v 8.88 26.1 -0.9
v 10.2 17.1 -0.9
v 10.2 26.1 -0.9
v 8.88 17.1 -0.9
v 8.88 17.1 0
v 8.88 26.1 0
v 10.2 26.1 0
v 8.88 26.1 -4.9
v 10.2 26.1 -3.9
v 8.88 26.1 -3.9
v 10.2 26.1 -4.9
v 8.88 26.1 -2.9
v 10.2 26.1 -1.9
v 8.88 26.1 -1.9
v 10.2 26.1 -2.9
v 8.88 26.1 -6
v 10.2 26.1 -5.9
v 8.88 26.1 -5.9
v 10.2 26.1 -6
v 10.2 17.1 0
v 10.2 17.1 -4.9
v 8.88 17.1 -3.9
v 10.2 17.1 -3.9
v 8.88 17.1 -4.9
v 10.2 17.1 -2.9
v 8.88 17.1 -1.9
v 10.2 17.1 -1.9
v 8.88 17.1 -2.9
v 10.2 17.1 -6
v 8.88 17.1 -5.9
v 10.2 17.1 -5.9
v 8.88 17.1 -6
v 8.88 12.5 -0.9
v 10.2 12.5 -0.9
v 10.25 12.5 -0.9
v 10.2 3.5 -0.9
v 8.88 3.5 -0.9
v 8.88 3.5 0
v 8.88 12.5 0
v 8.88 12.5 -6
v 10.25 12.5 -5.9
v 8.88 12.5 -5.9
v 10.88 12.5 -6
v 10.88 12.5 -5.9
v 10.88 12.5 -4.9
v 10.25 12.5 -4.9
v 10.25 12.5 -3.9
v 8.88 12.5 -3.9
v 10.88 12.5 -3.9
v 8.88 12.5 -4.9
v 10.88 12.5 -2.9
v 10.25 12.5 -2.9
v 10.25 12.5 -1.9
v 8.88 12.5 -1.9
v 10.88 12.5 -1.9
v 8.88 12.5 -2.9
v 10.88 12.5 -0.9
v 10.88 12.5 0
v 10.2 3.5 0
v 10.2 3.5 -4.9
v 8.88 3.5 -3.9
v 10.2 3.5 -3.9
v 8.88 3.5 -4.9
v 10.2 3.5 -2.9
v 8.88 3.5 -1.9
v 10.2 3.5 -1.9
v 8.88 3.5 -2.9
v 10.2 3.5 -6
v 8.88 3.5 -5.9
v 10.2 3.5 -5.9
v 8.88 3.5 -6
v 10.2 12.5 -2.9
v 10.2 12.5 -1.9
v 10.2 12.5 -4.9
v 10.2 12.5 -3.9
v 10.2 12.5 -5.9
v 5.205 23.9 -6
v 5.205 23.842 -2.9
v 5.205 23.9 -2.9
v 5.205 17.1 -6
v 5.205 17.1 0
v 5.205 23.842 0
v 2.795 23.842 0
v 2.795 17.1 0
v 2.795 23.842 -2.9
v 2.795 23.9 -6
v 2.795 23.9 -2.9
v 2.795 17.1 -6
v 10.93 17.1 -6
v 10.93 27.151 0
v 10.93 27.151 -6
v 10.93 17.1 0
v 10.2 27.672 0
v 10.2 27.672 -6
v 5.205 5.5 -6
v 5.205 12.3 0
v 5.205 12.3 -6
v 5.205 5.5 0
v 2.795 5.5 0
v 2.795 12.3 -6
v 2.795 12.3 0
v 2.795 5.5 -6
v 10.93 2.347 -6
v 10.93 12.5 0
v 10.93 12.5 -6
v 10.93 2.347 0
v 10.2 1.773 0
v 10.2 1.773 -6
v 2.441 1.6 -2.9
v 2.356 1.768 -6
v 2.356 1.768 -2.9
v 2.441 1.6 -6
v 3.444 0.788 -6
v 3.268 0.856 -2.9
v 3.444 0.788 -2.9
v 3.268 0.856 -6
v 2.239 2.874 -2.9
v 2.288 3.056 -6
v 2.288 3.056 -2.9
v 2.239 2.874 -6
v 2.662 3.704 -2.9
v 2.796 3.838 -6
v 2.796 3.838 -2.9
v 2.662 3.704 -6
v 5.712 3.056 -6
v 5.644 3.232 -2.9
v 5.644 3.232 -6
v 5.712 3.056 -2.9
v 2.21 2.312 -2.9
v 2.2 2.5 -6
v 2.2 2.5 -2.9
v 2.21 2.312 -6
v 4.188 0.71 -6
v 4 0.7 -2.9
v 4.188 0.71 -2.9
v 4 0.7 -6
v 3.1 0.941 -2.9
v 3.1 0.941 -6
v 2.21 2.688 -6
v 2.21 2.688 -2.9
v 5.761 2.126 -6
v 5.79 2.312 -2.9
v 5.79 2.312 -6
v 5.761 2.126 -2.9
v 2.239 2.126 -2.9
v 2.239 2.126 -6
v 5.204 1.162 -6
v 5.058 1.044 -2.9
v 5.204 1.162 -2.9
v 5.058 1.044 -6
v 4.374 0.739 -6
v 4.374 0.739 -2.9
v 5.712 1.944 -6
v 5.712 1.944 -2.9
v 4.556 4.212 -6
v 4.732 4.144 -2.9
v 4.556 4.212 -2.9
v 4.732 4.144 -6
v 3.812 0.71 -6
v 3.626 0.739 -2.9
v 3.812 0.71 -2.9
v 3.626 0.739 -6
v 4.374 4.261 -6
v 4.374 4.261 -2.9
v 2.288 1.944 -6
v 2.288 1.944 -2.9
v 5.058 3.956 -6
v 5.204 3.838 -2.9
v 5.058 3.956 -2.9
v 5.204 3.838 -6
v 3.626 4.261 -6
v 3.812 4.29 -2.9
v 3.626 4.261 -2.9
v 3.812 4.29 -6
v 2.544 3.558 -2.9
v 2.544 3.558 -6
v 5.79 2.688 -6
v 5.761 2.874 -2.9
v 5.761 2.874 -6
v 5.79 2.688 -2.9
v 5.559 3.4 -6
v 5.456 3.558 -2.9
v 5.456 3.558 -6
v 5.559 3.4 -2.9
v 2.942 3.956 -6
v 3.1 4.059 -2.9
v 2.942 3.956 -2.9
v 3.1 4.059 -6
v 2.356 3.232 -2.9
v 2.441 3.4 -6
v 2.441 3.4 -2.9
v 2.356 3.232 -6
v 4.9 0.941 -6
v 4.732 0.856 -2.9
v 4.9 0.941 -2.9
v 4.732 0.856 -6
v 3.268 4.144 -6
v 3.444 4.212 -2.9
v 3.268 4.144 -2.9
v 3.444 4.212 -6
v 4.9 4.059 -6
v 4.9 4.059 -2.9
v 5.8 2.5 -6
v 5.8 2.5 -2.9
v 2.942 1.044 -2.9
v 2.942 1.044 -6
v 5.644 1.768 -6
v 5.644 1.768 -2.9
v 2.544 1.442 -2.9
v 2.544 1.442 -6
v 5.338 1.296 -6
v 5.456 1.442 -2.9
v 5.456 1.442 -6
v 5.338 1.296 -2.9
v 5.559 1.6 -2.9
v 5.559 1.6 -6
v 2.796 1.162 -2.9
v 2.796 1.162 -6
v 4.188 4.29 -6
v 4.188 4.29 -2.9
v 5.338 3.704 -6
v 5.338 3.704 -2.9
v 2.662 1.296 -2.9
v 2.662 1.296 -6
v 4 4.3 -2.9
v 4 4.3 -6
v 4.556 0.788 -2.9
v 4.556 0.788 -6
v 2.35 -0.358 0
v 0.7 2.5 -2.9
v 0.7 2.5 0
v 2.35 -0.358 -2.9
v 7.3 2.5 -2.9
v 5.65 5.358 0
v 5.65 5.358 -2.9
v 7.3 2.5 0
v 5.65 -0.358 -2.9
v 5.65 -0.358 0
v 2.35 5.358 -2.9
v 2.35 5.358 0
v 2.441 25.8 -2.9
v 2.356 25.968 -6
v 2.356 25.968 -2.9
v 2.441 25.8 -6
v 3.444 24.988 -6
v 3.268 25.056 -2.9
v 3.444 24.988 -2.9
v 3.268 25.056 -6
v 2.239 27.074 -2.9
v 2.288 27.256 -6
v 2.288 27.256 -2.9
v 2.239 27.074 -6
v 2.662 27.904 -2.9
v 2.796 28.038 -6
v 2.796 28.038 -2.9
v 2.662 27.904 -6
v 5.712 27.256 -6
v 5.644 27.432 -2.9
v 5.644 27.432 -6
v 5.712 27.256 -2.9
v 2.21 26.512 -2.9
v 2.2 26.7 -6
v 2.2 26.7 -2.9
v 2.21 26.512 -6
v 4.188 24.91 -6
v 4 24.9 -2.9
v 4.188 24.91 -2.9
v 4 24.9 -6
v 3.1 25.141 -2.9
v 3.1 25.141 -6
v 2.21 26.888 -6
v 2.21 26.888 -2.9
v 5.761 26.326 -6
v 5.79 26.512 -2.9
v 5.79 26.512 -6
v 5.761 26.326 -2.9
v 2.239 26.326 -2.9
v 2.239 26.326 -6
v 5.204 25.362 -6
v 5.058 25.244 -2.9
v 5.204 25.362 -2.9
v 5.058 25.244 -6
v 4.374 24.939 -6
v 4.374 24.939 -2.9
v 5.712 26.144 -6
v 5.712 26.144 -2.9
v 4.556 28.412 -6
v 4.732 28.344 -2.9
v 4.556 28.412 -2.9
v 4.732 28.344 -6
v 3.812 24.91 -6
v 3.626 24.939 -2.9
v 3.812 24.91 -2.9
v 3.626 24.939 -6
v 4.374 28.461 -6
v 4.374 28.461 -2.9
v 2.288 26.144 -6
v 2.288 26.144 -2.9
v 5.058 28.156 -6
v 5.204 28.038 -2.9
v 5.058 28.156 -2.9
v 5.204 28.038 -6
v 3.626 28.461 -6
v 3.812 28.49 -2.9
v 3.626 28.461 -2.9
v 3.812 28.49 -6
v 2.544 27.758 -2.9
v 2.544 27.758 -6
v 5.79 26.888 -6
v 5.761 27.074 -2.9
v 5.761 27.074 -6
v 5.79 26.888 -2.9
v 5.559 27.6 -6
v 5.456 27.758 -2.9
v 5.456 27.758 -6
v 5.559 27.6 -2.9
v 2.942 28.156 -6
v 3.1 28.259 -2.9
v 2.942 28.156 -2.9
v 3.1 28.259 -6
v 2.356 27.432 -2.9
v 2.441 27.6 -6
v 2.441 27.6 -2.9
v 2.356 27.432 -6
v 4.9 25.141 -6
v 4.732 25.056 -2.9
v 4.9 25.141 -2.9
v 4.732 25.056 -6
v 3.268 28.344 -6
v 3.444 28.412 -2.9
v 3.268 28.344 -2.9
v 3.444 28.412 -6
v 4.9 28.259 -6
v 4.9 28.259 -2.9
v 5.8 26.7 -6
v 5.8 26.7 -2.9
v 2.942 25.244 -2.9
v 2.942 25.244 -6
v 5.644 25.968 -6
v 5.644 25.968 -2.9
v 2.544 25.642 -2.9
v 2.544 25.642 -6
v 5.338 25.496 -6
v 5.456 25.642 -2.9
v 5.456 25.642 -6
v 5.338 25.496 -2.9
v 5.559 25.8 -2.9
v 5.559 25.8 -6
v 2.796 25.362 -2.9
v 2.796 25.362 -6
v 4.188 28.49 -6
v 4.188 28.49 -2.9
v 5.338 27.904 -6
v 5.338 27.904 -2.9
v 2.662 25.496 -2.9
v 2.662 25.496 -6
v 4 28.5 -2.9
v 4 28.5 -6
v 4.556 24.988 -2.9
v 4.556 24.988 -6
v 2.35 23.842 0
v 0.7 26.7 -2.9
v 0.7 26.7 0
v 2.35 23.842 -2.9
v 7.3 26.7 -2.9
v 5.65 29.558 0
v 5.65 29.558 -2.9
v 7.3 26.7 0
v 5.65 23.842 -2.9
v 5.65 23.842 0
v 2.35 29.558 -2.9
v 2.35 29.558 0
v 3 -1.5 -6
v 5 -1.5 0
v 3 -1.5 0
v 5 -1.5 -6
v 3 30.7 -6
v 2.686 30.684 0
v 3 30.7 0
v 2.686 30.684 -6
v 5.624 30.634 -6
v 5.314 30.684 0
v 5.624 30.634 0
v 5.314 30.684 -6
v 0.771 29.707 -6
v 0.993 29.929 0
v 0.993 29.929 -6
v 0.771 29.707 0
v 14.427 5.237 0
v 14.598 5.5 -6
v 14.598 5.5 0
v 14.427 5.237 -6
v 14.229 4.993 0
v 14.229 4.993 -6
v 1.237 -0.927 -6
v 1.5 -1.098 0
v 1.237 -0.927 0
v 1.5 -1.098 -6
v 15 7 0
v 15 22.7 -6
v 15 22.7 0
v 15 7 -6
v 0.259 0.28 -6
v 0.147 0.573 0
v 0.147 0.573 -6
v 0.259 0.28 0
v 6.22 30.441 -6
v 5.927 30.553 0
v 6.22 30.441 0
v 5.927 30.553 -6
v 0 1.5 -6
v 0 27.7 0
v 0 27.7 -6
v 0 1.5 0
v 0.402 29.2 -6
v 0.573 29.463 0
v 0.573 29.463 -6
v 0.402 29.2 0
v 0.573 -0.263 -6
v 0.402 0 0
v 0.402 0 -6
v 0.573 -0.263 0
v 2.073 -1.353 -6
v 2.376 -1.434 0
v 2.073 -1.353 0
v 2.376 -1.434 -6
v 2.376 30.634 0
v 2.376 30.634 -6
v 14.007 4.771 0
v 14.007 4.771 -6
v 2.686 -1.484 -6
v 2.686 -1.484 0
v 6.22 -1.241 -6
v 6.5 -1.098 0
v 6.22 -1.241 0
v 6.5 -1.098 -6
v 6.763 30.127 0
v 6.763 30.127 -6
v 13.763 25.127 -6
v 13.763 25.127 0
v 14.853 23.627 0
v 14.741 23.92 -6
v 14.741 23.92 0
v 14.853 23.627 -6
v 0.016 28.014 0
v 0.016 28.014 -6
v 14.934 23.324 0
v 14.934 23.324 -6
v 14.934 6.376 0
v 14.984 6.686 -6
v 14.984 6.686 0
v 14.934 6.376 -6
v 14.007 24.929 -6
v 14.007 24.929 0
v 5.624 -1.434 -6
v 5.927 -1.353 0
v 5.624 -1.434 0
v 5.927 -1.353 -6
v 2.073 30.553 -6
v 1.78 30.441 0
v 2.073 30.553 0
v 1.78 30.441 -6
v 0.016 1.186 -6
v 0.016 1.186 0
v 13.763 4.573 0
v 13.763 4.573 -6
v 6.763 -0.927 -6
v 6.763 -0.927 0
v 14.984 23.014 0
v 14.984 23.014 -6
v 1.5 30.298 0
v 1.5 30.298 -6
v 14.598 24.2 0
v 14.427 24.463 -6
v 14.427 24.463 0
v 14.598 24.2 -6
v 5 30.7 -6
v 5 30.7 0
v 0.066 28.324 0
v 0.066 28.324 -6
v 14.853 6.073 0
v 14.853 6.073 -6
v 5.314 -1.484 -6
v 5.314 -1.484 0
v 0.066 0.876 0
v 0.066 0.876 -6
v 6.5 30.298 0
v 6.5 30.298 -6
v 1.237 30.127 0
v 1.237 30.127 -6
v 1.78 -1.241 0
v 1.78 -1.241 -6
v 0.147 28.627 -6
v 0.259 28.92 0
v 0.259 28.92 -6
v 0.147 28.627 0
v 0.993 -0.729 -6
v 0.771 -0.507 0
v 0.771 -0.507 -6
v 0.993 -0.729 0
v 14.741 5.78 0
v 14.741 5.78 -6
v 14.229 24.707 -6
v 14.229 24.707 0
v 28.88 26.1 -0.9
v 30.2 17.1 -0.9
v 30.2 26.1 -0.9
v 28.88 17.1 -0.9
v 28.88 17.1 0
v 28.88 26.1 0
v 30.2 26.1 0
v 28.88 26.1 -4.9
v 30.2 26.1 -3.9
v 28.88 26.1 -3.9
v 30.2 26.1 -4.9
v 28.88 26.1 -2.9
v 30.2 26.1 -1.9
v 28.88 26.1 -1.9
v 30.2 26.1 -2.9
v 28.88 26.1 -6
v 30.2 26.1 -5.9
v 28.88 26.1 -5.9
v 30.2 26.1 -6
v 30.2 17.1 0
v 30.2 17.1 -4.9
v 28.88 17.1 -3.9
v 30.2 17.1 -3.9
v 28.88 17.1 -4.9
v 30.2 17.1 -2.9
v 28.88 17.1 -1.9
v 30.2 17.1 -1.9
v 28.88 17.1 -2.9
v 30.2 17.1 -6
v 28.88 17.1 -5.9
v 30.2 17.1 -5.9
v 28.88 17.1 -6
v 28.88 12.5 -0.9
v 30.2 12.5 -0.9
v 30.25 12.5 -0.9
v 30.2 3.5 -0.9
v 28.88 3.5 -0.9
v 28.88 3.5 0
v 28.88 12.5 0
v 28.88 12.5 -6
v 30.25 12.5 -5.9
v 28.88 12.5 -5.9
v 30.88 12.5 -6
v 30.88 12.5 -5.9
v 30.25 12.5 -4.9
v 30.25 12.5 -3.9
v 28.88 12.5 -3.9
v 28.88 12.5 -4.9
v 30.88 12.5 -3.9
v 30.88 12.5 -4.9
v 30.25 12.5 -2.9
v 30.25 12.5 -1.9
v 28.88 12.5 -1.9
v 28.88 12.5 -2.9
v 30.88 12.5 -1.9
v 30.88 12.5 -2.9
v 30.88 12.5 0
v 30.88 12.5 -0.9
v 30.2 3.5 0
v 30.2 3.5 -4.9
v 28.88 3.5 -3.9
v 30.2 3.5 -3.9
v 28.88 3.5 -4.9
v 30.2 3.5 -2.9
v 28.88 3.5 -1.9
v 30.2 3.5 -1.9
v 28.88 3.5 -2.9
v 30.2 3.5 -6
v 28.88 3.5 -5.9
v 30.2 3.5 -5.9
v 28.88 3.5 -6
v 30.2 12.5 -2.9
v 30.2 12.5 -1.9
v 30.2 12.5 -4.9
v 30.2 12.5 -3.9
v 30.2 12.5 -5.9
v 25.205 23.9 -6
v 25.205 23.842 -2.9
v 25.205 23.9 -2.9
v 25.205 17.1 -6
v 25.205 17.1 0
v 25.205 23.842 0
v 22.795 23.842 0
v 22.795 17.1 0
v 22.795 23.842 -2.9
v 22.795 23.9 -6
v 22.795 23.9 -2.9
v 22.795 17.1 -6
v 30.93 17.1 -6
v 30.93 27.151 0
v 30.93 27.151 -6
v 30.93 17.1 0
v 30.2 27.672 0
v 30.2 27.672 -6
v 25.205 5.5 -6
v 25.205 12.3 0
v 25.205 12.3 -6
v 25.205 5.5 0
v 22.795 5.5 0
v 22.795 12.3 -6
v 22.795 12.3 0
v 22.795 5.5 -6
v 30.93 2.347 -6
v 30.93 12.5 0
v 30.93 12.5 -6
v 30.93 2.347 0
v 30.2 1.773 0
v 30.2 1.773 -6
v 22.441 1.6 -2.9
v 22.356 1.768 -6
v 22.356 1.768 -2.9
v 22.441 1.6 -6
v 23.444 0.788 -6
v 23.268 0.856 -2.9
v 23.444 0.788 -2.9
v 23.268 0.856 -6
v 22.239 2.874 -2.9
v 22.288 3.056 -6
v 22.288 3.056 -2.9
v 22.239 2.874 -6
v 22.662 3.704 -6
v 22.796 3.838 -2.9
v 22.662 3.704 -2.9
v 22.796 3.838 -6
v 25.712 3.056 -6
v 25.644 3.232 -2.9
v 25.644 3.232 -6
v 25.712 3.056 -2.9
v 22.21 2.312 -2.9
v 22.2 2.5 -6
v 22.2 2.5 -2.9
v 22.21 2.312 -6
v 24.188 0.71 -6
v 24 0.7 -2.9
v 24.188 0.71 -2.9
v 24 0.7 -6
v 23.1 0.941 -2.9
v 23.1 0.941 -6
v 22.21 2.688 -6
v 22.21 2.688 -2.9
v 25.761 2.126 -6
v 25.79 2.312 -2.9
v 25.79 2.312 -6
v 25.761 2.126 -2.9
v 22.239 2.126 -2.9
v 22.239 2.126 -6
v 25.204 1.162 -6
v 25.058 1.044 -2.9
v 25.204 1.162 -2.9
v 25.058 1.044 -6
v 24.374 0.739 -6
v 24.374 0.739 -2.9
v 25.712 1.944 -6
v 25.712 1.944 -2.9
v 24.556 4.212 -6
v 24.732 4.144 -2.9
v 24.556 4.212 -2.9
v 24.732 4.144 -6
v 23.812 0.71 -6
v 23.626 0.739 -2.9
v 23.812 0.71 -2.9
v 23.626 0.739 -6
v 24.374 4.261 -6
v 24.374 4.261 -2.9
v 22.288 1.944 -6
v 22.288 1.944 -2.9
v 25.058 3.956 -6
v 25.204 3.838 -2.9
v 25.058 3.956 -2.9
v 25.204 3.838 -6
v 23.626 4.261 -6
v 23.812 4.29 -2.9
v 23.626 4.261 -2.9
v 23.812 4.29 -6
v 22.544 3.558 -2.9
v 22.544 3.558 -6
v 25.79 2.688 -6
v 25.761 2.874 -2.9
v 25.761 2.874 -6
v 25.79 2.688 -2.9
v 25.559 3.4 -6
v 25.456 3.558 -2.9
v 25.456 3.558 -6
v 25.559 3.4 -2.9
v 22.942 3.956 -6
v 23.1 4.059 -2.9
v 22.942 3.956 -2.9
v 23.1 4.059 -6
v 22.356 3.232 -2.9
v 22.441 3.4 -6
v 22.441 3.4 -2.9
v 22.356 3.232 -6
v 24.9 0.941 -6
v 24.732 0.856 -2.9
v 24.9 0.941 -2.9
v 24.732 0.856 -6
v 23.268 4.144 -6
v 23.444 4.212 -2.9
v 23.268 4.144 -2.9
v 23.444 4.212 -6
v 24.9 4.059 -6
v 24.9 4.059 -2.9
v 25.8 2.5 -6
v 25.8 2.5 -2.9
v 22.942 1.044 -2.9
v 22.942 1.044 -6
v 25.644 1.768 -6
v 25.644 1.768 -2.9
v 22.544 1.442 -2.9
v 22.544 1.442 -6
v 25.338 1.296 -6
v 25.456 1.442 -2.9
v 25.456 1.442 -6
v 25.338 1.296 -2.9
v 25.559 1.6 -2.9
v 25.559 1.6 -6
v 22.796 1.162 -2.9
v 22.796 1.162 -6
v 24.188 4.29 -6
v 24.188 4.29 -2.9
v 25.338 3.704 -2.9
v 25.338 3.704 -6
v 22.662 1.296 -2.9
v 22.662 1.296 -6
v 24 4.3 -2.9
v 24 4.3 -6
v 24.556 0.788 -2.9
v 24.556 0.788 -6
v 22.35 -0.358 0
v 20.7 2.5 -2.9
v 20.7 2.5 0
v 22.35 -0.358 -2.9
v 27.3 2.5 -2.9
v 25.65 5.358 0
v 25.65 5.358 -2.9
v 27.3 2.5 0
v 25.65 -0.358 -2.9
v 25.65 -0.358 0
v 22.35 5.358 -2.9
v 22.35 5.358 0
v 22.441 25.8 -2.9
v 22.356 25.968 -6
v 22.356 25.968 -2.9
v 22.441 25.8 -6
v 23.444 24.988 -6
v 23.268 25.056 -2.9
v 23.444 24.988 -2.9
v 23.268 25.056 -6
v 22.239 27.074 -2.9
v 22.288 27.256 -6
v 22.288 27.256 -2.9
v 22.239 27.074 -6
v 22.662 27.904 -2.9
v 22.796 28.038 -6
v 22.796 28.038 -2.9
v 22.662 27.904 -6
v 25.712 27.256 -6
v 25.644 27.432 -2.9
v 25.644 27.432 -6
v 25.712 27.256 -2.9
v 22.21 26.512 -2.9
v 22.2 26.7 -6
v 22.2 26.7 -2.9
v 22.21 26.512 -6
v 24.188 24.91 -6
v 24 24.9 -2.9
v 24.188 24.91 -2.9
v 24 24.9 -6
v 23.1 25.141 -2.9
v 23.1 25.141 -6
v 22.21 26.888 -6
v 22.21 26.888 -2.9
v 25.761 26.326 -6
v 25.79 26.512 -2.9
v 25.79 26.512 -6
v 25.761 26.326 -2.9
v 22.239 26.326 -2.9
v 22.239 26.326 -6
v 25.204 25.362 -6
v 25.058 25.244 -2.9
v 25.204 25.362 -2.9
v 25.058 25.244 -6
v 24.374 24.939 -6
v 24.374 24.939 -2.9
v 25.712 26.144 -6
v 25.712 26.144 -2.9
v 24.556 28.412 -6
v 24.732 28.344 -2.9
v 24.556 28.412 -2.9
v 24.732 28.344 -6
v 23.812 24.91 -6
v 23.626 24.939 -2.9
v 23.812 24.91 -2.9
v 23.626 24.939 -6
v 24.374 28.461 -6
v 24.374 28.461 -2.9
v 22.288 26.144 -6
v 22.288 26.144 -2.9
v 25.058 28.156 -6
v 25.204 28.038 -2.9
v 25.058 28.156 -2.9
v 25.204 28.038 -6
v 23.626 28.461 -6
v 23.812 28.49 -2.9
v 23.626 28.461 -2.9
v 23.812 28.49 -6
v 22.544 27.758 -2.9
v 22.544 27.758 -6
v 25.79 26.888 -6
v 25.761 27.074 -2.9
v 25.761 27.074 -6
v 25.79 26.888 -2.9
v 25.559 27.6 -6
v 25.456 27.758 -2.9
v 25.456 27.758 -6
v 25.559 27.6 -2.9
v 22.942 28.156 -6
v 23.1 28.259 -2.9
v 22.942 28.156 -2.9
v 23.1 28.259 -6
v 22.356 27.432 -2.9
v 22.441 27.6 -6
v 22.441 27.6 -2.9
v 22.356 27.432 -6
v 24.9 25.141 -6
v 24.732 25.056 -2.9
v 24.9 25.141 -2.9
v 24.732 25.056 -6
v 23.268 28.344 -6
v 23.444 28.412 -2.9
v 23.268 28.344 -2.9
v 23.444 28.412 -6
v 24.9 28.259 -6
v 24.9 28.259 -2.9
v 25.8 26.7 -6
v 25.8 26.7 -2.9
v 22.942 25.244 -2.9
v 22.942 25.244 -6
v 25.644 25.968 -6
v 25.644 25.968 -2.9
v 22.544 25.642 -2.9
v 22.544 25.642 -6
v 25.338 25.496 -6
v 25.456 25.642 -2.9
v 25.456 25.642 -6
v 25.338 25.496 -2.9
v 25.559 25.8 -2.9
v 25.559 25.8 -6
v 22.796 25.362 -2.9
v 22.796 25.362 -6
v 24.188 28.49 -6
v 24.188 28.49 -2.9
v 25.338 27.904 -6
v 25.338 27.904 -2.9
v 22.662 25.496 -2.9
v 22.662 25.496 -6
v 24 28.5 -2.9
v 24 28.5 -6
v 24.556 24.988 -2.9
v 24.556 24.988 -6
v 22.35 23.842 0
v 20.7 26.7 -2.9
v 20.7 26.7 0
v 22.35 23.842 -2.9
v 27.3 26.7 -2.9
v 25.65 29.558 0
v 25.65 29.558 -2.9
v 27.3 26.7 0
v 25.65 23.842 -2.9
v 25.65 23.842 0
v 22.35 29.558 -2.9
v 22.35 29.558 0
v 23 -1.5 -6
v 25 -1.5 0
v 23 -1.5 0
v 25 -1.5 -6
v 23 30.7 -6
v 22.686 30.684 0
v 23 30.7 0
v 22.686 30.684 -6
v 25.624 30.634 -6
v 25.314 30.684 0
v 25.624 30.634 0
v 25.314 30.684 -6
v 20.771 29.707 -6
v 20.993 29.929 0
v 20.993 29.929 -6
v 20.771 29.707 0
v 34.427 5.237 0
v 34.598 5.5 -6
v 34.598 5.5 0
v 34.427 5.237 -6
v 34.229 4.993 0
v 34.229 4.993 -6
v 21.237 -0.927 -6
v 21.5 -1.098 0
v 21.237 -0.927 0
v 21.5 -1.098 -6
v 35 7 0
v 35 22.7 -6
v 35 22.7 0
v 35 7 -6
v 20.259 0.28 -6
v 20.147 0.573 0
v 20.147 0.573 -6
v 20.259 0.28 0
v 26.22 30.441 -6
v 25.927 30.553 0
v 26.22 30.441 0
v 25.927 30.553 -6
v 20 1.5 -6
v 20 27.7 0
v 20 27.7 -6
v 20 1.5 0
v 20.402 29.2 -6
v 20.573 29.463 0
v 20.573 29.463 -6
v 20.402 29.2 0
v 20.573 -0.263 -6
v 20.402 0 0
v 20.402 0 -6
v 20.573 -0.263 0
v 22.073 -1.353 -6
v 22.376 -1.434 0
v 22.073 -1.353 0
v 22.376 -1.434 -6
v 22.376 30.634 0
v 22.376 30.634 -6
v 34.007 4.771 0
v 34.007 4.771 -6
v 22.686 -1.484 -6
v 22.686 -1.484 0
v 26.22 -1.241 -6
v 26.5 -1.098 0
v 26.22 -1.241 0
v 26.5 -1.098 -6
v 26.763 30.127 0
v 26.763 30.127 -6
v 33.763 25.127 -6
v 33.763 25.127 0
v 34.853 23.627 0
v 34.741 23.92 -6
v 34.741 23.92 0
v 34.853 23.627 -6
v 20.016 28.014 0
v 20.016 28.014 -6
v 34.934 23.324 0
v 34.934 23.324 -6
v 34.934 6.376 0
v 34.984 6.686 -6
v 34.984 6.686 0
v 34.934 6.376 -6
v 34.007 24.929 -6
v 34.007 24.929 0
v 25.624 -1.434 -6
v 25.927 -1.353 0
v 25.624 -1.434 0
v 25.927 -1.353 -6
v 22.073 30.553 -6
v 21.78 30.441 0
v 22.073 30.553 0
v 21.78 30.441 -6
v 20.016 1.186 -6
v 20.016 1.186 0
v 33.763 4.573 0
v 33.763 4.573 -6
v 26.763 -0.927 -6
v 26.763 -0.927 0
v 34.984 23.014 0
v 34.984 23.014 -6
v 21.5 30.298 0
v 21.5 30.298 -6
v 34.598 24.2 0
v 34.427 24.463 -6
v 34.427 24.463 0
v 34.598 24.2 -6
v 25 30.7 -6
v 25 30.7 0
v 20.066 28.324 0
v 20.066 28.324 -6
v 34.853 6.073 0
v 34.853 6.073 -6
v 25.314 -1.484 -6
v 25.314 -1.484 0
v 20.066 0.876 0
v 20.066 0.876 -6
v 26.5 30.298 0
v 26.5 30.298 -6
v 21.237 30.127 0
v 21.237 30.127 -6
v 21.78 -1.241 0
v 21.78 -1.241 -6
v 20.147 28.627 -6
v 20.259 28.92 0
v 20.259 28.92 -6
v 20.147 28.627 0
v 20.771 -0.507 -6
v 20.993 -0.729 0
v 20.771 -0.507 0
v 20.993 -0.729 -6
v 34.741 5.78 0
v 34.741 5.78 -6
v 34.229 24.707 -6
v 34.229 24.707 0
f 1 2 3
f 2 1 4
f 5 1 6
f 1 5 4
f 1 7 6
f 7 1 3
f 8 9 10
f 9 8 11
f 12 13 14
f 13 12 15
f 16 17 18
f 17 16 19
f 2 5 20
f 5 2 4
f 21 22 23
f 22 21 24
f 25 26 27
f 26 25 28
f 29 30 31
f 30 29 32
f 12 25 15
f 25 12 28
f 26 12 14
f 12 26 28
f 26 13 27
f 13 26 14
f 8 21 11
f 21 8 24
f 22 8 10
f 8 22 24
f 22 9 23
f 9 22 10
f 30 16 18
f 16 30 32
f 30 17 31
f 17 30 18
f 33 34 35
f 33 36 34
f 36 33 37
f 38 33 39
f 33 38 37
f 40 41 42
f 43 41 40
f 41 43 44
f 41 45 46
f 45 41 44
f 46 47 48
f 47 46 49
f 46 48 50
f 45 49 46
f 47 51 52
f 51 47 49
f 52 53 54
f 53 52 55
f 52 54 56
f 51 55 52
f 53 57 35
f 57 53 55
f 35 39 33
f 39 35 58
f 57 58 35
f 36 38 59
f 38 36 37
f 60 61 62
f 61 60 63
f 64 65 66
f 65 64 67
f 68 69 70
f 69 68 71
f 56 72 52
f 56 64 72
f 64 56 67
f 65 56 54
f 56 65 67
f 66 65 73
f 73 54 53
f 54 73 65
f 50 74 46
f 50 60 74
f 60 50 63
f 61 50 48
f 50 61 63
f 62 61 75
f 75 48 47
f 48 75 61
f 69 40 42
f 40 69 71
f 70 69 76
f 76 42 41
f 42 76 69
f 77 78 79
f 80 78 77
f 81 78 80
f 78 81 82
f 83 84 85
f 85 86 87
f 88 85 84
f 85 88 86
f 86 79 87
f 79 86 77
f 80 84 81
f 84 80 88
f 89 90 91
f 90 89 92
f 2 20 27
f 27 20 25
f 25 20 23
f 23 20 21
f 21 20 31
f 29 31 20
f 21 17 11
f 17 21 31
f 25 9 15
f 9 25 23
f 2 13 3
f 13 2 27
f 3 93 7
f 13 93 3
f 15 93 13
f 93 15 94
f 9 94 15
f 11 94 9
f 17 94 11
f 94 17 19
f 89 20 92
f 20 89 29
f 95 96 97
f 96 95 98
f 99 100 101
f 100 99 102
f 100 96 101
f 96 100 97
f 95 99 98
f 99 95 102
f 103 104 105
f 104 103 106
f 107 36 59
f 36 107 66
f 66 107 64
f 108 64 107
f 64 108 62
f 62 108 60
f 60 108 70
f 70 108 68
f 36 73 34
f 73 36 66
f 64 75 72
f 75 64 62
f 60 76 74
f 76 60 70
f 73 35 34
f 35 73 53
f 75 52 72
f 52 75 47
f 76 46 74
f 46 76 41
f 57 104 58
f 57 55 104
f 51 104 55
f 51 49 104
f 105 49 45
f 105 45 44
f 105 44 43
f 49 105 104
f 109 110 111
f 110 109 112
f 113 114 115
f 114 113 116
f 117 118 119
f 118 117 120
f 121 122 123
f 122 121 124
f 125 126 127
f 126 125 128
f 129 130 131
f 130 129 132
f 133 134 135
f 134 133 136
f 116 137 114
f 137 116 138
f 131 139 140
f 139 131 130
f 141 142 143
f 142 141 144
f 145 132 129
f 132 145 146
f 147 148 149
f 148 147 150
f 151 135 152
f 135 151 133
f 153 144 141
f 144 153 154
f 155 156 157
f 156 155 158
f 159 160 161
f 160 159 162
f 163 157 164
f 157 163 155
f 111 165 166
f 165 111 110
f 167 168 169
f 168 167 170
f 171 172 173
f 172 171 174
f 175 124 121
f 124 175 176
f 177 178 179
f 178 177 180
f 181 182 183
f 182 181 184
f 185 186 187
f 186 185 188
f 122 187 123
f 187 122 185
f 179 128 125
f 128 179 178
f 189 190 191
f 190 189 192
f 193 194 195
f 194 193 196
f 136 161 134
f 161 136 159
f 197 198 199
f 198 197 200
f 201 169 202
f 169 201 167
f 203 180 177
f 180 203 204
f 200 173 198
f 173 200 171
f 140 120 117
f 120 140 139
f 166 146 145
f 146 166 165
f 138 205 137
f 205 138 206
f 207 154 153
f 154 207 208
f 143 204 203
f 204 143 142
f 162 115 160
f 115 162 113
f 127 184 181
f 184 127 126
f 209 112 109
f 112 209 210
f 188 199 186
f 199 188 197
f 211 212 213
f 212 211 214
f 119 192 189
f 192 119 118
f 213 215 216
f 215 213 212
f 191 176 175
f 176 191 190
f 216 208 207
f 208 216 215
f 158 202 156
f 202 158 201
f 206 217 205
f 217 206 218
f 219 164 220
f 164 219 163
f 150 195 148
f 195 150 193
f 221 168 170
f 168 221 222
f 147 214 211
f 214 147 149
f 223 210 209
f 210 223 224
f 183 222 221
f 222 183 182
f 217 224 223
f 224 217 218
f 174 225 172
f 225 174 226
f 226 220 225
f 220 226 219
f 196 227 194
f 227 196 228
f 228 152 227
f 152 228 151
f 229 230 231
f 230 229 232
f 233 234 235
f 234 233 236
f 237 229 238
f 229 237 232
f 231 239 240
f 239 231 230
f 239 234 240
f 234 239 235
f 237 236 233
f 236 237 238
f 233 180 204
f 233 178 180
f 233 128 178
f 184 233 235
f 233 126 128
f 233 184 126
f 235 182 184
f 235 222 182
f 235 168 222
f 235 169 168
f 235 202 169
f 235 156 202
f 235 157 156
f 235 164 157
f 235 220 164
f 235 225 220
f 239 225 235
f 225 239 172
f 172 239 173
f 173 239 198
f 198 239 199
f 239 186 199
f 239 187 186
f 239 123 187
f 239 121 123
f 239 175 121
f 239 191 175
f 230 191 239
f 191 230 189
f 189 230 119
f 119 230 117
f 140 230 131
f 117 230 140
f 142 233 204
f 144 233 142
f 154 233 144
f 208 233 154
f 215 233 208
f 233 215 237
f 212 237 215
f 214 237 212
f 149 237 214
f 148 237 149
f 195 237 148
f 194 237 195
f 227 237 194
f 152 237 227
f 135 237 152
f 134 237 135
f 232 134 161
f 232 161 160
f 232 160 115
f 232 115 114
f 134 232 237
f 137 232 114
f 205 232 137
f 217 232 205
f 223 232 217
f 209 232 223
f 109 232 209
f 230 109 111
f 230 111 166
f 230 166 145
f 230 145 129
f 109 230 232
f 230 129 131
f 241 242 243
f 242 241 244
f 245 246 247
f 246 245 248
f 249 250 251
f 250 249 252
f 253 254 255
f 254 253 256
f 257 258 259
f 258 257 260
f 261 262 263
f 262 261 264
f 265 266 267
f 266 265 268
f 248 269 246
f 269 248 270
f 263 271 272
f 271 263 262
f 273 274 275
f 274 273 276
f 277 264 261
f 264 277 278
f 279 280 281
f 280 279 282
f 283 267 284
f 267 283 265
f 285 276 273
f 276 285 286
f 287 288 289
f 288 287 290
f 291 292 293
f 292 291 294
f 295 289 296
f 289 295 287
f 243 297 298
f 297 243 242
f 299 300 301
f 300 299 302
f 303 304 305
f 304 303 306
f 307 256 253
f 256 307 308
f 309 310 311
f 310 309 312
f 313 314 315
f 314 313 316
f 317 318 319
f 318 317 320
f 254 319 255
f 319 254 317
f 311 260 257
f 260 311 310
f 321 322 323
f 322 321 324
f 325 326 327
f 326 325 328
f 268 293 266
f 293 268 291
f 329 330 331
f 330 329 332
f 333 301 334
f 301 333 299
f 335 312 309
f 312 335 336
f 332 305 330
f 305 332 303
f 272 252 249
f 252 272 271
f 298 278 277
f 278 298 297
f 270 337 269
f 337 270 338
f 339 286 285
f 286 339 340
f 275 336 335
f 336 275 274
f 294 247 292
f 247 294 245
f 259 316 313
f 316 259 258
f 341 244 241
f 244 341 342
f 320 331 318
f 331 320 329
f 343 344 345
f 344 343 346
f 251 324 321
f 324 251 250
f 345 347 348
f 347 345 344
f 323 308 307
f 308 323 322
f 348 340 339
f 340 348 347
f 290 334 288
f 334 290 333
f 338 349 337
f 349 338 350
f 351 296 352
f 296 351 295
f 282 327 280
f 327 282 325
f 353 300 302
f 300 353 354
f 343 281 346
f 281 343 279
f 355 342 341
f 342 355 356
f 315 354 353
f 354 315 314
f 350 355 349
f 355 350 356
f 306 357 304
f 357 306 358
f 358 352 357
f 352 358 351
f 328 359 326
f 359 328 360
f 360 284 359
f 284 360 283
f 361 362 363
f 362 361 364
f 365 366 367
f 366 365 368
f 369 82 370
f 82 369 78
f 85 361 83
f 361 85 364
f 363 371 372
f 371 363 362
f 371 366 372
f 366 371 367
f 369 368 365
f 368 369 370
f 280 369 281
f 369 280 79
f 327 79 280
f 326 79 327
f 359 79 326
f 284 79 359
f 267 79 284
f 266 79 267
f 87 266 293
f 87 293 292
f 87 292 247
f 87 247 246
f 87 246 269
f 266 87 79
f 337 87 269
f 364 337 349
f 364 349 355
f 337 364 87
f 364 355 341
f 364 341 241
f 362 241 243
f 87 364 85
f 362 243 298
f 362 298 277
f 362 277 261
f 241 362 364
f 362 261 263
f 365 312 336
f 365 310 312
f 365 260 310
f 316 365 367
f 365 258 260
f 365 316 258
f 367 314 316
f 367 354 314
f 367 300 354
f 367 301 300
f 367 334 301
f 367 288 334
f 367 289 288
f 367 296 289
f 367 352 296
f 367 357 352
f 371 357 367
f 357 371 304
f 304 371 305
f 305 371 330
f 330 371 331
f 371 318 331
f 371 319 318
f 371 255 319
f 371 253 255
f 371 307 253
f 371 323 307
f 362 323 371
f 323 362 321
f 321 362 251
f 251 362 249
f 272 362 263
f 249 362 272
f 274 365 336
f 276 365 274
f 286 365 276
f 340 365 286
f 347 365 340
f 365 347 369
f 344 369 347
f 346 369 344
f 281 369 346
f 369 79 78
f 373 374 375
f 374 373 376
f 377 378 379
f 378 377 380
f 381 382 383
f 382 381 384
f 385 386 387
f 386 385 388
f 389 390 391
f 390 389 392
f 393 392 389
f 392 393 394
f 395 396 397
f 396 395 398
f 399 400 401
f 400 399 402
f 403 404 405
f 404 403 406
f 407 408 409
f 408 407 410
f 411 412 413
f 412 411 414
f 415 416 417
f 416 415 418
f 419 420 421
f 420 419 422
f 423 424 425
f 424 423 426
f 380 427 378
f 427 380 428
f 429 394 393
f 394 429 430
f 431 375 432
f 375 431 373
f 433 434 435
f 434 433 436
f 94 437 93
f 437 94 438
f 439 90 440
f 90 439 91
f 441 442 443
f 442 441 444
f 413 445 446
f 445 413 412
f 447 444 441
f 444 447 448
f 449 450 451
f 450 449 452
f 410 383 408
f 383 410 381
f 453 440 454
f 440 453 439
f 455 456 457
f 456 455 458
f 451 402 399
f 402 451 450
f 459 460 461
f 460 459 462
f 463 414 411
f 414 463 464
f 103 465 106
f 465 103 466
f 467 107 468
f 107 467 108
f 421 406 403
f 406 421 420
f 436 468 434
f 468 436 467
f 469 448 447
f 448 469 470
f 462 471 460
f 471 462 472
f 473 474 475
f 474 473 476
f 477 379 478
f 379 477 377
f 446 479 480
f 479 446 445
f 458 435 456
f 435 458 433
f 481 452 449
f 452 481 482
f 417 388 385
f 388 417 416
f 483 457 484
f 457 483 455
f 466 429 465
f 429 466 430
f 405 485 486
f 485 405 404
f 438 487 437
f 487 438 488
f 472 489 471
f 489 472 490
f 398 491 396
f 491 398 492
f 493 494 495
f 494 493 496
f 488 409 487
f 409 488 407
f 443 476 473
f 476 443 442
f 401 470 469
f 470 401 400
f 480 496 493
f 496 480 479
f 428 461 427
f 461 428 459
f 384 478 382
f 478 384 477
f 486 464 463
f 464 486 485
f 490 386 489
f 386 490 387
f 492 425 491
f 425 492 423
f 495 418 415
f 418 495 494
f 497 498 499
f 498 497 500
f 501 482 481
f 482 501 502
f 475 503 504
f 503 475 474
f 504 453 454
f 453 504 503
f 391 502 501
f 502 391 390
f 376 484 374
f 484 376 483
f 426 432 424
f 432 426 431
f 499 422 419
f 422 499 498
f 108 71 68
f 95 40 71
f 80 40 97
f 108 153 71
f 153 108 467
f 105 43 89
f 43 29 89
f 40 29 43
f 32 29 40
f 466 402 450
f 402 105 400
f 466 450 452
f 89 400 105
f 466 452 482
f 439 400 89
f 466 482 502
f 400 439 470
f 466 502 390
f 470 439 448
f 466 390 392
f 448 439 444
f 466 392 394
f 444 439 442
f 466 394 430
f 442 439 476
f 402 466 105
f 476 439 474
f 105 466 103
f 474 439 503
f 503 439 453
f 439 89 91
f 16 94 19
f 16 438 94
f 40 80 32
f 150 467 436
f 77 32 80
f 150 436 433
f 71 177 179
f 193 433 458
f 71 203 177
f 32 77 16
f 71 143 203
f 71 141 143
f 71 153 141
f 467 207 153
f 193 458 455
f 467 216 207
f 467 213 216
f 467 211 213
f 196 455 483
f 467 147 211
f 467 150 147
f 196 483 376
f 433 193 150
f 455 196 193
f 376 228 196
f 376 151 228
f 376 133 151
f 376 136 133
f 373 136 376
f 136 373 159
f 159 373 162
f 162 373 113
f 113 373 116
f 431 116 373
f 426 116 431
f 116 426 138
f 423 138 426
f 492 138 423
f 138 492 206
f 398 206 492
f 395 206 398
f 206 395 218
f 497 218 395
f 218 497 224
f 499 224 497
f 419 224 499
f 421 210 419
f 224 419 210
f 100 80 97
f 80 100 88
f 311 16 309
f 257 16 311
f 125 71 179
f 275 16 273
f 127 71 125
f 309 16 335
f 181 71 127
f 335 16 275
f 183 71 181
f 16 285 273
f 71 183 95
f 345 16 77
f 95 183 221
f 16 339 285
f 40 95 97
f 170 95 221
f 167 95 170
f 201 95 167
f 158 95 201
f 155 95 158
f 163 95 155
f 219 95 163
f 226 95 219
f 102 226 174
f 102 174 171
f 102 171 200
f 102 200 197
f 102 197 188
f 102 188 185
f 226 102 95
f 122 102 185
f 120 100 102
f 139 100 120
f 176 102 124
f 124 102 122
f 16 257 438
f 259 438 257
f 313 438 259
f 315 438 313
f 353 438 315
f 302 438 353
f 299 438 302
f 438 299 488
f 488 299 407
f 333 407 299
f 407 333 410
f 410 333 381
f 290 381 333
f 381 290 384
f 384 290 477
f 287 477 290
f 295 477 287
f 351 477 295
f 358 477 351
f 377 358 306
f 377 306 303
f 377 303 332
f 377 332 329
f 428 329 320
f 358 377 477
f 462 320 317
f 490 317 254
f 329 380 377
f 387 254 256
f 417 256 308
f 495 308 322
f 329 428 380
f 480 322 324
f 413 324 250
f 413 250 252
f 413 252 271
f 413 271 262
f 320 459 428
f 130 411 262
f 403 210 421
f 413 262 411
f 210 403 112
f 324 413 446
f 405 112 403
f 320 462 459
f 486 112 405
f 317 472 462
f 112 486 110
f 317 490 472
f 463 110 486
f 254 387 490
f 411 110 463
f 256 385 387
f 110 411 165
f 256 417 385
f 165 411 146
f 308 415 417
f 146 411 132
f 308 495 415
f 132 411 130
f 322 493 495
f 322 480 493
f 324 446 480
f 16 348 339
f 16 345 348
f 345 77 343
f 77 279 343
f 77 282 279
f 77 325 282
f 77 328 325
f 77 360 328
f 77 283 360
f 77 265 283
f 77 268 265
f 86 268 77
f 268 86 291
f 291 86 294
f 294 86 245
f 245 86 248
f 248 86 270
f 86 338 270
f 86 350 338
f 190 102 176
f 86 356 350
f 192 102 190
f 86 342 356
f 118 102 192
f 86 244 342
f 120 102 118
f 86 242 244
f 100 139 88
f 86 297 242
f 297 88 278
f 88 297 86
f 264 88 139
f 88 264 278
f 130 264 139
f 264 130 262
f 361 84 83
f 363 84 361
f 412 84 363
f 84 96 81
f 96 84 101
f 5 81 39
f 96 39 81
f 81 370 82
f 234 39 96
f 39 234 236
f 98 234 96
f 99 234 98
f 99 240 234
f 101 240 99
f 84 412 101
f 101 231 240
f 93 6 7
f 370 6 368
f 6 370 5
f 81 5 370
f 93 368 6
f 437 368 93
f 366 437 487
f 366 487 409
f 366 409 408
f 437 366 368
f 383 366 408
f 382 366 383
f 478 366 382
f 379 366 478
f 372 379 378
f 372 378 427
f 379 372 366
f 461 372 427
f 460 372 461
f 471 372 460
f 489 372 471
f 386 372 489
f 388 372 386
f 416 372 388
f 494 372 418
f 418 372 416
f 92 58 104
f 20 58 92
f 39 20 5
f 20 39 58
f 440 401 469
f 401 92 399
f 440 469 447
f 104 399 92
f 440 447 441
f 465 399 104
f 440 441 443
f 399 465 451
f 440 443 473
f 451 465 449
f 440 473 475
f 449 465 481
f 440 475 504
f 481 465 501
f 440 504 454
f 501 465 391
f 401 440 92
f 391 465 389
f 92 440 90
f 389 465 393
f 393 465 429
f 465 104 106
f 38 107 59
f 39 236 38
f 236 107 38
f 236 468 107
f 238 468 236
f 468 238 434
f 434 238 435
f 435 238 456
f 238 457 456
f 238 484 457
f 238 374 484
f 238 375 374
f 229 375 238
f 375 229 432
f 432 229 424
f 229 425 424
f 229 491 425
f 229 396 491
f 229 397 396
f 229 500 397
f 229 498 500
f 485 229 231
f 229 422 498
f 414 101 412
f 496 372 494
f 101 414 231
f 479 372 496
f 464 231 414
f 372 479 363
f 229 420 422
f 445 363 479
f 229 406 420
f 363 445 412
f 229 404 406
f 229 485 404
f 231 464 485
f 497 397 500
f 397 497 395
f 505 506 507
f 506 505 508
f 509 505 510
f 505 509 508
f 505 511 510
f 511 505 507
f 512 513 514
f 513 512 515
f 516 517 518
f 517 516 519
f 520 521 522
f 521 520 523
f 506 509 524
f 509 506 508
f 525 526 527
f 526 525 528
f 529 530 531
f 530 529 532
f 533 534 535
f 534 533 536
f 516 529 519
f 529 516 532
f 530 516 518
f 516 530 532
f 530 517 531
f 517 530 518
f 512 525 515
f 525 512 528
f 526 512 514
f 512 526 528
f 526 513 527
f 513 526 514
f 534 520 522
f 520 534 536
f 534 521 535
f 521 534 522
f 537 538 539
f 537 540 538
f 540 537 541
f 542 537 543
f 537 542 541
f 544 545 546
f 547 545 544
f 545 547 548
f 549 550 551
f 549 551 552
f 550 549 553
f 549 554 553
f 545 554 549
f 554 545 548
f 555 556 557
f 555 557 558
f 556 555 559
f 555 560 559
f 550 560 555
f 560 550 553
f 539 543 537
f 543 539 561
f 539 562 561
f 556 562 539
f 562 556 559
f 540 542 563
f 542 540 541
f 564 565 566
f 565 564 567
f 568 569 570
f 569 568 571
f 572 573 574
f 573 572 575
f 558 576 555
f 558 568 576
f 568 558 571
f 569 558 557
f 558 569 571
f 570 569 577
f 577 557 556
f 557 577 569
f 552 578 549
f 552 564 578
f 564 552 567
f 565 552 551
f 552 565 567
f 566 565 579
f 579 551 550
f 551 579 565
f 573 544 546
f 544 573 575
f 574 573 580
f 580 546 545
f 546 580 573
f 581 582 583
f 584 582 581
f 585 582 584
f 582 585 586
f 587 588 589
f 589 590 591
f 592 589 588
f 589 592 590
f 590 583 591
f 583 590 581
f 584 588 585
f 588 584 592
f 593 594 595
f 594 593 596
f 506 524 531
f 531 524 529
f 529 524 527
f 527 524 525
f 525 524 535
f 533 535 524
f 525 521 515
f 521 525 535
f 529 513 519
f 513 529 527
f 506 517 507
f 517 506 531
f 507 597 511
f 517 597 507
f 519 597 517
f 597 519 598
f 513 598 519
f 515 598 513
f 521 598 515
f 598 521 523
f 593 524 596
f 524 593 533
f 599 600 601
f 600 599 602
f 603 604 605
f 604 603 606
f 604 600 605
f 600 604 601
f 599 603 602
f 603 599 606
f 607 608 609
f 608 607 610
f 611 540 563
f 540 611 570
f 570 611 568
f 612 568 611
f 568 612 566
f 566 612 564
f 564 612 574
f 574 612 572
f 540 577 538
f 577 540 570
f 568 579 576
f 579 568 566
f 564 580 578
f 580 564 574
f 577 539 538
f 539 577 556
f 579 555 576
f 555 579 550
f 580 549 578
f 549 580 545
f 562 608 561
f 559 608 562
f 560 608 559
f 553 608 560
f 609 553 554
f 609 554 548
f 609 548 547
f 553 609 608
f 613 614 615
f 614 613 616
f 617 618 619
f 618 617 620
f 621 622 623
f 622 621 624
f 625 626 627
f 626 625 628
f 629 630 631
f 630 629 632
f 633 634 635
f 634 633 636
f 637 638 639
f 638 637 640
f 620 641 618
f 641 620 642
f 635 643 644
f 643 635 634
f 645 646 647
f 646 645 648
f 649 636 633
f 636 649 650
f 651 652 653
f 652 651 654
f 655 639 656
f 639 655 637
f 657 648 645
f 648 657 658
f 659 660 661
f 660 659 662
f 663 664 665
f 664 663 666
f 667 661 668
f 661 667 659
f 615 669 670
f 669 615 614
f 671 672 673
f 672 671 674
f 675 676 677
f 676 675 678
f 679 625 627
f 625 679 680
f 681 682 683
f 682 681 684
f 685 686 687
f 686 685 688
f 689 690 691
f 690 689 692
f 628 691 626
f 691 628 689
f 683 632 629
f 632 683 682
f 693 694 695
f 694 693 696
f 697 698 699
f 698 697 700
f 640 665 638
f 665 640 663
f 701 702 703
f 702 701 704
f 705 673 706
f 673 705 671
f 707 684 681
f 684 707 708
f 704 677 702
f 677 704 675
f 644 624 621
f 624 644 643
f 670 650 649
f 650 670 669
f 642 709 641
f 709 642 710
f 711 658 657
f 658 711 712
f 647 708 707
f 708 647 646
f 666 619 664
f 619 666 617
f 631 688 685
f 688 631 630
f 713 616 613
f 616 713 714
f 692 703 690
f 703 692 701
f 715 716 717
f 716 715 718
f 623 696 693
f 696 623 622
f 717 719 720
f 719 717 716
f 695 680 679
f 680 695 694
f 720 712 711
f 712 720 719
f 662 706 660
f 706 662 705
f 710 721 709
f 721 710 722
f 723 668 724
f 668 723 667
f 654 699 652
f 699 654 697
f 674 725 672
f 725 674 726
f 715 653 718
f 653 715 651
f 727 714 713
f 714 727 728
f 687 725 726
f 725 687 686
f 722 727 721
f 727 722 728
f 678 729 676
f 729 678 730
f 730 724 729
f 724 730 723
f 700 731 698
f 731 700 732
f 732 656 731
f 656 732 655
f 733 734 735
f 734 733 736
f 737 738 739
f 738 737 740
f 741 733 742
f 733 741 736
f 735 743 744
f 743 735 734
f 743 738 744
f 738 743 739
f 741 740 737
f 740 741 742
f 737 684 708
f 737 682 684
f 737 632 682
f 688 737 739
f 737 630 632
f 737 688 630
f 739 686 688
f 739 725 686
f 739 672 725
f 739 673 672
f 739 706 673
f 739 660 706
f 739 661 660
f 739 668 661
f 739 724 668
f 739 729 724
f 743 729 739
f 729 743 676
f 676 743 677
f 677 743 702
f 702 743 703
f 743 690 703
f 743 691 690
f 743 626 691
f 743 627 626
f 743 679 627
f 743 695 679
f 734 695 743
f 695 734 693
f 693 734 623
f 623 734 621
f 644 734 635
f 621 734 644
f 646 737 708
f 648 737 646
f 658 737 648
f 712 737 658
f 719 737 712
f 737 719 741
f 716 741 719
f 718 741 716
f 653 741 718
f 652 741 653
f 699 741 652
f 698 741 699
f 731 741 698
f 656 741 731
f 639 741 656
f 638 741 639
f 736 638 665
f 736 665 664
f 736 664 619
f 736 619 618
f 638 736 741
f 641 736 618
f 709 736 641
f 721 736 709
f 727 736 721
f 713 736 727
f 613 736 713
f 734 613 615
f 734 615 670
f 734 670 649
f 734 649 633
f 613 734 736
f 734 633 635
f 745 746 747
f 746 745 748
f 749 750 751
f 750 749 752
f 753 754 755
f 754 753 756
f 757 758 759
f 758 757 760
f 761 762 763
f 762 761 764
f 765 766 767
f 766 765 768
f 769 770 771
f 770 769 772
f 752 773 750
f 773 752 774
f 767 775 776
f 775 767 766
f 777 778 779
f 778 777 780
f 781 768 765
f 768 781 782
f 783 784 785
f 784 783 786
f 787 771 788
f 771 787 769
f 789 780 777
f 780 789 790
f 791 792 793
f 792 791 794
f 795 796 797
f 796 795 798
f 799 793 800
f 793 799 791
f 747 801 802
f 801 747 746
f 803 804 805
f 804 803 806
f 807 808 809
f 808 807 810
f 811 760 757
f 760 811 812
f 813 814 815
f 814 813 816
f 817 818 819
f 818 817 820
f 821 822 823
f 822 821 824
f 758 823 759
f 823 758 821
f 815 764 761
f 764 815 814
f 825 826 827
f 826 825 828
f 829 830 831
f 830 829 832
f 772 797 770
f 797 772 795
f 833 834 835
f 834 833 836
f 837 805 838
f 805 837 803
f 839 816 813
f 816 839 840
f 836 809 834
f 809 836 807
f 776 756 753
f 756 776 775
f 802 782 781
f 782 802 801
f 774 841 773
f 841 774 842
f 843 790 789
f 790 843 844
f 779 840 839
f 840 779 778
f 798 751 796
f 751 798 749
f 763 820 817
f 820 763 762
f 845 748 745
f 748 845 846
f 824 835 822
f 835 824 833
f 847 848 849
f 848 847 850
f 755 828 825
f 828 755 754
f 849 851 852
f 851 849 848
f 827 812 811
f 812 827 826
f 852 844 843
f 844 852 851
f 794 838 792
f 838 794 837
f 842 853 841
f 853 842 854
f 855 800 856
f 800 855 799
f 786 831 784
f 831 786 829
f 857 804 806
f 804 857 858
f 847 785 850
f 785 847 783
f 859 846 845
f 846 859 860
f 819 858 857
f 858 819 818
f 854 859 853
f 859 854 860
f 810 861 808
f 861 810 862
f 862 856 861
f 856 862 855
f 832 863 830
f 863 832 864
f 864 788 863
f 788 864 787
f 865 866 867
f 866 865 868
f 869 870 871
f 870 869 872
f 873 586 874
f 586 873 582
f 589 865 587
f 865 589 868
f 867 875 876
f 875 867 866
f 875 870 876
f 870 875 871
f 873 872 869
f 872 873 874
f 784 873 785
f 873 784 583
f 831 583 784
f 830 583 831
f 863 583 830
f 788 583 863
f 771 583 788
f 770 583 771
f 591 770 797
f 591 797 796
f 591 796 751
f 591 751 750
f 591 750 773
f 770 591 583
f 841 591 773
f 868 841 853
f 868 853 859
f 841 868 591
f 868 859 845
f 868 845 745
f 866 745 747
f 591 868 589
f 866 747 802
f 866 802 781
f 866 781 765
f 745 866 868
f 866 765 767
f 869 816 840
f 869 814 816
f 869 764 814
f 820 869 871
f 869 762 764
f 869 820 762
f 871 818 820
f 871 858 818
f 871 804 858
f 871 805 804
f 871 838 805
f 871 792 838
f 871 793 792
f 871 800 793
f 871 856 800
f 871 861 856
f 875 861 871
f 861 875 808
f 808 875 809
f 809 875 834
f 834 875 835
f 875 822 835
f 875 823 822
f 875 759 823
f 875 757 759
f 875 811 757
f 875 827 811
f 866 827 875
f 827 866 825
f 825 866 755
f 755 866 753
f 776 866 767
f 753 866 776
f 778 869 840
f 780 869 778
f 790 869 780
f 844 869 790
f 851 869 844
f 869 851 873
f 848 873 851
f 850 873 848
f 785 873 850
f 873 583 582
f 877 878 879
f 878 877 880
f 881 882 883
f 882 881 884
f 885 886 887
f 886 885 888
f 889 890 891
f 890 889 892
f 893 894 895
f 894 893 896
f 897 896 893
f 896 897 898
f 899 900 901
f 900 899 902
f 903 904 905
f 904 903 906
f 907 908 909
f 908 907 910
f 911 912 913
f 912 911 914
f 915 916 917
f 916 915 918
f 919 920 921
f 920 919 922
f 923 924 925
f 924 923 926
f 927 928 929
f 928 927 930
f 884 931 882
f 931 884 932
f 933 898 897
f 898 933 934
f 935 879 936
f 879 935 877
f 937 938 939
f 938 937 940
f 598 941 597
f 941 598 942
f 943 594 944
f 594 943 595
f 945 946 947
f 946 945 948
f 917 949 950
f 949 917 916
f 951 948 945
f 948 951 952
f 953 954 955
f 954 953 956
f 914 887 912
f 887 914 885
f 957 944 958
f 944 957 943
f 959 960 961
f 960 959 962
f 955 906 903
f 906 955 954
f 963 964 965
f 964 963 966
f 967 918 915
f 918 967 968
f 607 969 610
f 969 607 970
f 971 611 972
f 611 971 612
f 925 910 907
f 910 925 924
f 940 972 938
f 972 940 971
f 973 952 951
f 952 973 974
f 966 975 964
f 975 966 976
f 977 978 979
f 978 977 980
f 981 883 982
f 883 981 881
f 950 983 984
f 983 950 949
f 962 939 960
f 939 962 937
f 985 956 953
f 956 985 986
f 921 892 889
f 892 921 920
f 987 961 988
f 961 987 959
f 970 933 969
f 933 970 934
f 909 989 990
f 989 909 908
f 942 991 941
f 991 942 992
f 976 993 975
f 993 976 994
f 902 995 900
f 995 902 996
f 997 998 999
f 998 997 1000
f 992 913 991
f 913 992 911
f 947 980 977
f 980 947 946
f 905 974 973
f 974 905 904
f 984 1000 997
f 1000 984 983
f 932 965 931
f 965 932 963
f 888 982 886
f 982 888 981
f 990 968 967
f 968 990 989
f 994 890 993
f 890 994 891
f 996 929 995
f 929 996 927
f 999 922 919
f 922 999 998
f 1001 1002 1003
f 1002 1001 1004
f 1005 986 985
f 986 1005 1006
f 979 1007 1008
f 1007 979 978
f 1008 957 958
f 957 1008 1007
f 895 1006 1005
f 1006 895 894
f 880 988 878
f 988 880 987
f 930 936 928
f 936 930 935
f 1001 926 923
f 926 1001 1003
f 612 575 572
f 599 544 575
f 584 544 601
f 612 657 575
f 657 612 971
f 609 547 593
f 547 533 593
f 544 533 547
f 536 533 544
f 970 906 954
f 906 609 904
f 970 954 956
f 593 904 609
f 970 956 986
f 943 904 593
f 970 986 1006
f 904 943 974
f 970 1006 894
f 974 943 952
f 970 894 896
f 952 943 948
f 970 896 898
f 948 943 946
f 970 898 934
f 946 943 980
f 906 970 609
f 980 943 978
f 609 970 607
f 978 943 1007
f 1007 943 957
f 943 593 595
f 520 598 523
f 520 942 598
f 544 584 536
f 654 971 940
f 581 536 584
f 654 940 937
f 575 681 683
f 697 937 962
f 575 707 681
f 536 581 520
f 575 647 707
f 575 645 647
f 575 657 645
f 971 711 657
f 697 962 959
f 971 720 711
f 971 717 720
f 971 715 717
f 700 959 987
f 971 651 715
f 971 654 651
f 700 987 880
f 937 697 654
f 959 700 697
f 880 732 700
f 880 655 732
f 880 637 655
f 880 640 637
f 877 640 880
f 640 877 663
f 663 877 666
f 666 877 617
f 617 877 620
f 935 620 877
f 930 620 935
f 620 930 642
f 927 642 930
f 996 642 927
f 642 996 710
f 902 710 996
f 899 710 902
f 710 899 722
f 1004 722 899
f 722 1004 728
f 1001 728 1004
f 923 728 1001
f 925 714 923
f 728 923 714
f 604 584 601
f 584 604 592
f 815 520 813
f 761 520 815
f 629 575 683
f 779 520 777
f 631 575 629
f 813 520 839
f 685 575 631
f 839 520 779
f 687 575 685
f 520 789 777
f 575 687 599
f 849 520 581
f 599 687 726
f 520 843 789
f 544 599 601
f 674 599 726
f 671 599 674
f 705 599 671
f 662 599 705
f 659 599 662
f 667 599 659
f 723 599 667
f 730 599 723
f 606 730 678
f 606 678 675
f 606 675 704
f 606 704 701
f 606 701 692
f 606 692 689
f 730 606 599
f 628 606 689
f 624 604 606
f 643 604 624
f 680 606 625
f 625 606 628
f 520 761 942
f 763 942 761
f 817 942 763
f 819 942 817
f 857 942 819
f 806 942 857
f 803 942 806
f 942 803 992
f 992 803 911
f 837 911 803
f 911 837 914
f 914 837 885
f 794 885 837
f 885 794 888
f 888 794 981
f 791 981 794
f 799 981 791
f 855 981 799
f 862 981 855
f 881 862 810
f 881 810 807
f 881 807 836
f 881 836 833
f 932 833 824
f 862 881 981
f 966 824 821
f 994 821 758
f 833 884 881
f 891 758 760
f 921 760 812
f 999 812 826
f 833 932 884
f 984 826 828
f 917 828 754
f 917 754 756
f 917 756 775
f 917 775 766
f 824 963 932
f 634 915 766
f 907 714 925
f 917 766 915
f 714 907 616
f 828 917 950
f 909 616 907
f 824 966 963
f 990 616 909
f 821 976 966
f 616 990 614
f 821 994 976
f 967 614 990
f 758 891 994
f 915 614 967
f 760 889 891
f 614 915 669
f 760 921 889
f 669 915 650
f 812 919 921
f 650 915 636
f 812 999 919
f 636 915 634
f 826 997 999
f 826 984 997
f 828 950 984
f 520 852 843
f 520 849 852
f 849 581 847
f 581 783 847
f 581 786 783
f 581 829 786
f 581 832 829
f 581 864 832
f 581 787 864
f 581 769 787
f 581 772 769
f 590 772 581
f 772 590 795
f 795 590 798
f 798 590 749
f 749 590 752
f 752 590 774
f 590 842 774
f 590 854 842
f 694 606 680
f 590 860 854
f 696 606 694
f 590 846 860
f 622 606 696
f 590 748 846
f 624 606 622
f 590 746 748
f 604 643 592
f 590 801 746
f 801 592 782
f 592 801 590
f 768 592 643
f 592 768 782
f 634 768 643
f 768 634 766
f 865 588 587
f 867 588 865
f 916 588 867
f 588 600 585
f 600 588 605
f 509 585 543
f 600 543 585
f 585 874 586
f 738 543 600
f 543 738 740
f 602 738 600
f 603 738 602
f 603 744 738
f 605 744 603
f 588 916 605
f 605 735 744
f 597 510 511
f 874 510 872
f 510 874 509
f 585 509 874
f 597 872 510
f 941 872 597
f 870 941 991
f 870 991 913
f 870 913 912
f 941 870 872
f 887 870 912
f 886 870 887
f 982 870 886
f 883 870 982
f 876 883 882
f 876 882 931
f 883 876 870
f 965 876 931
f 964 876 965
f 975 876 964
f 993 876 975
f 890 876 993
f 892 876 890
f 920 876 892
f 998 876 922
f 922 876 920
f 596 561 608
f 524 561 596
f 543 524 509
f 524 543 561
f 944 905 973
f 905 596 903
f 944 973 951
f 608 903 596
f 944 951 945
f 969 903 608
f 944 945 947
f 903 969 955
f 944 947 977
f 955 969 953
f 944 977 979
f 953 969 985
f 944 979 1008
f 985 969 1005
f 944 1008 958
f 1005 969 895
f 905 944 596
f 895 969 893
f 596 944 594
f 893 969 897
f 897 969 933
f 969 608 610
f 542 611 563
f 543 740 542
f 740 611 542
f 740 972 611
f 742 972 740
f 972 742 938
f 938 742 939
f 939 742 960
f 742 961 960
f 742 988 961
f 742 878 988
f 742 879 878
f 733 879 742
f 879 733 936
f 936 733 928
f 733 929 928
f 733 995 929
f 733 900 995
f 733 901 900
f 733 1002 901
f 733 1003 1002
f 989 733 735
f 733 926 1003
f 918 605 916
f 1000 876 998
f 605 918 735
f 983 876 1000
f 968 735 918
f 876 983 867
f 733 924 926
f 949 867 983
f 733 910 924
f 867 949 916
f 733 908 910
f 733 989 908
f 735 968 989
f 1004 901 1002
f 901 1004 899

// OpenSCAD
// file: library.scad
//rounded cube Functions from: http://www.thingiverse.com/thing:38069


module cube_fillet(size,radius=-1,vertical,top,bottom,center=false,$fn=0){
    if (center) {
        cube_fillet_inside(size, radius, vertical, top, bottom, $fn=$fn);
    } else {
        translate([size[0]/2, size[1]/2, size[2]/2])
            cube_fillet_inside(size, radius, vertical, top, bottom, $fn=$fn);
    }
}
module fillet(radius, height=100, $fn=60) {  
    //this creates negative of fillet,
    //i.e. thing to be substracted from object
    translate([-radius, -radius, -height/2-0.01])
        difference() {
            cube([radius*2, radius*2, height+0.02]);
            cylinder(r=radius, h=height+0.02, $fn=$fn);
        }
}

module cube_negative_fillet(size,radius=-1,vertical, top,bottom,$fn=0){
    j=[1,0,1,0];

    for (i=[0:3]) {
        if (radius > -1) {
            rotate([0, 0, 90*i])
                translate([size[1-j[i]]/2, size[j[i]]/2, 0])
                    fillet(radius, size[2], $fn=$fn);
        } else {
            rotate([0, 0, 90*i])
                translate([size[1-j[i]]/2, size[j[i]]/2, 0])
                    fillet(vertical[i], size[2], $fn=$fn);

        }
        rotate([90*i, -90, 0])
            translate([size[2]/2, size[j[i]]/2, 0 ])
                fillet(top[i], size[1-j[i]], $fn=$fn);
        rotate([90*(4-i), 90, 0])
            translate([size[2]/2, size[j[i]]/2, 0])
                fillet(bottom[i], size[1-j[i]], $fn=$fn);
    }
}

module cube_fillet_inside(size,radius=-1,vertical,top,bottom,$fn=0){

    if (radius == 0) {
        cube(size, center=true);
    } else {
        difference() {
            cube(size, center=true);
            cube_negative_fillet(size, radius, vertical, top, bottom, $fn=$fn);
        }
    }
}
// file: dimensions.scad
// Dimensions
// Author: sdavi


LM8UU = [8, 15, 24];//rod diameter,outter diameter, length
LM12UU = [12, 21, 30];
LM12LUU = [12, 21, 57];
LM12UUx2 = [LM12UU[0], LM12UU[1], LM12UU[2]*2];

BEARING_624 = [4,13,5]; //inner diameter(hole), outter diameter, thickness (http://reprap.org/wiki/Ball_bearing)
BEARING_2x624 = [4, 13, 10]; // 2 624 bearings together, good size for GT2

BEARING_6300 = [10,35,11]; //inner diameter, outer diameter, thickness

vslot_wheel = [23.89,10.23];	//23.89 & 10.23
vslot_wheel_hole = 5+0.5;
vslot_wheel_eccentric = 7.2+0.5; //hole for eccentric spacer
vslot_wheel_spacer_length = 6.35;


t_nut_length = 15+1; //hole in center 1mm cleanance incase hole isnt actually center




GT2_belt_width = 6;
GT2_belt_pitch = 2;
GT2_belt_thickness = 1.38;
GT2_belt_tooth_height = 0.75;  
GT2_belt_tooth_ratio = 0.5;



GT2_pulley_geared_diameter=12.2;//measured from top of tooth to top of tooth opp side// 12.2 is for the 20 tooth pulley

//from metric (prusa i3)
m4_diameter = 4.6;
m4_nut_diameter = 7.6;
m4_nut_diameter_horizontal = 8.15;

m3_diameter = 3.6;
m3_nut_diameter = 5.3;
m3_nut_diameter_horizontal = 6.8;
m3_washer_diameter = 6.9;
//end i3 variables

m5_diameter = 5.5;

//Hex Head M3x30: Head 5.5mm flat to flat, 2.12mm thick
m3_hex_head_diameter = 5.5*2/sqrt(3) + 0.2;

M4 = m4_diameter;
M3 = m3_diameter;
M5 = m5_diameter;
m4_washer_thickness = 0.8; //flat and penny washers
m4_washer_diameter = 9.6;

nema17_holes = 31;// mm between screws
nema17_width = 42; //width
nema17_height = 48;
// file: configuration.scad
// Configuration
// Author: sdavi


include <dimensions.scad>
use <library.scad>


x_rod_distance = 45;

y_bearing = LM8UU;
x_bearing = LM8UU;
//z_bearing = LM12UUx2;
z_bearing = LM12LUU;
belt_bearing = BEARING_2x624;


end_belt_bearing_distance = 25;// distance between 2 bearings on y-ends
belt_clearance = 9.5; //space for belts
x_belt_clearance = 5; //spacing between x-axis vslot and belt

frame_screw = M5; //m5 screws for v/tslot

// calculated vars


//y bearing block
y_bearing_block_length = 2*y_bearing[2] + M3*2 + 5;
//y_bearing_block_width = y_bearing[1]+5;
y_bearing_block_width = 20; //vslot frame width

y_bearing_block_height = 6+y_bearing[1]/2;

//xy_bearing_distance = y_bearing_block_width/2+belt_clearance+belt_bearing[1]/2; //distance between center of y-bearing to center of x-belt bearing 
xy_bearing_distance = vslot_wheel[1]/2+vslot_wheel_spacer_length+belt_clearance+belt_bearing[1]/2; //distance between center of v_slot to center of x-belt bearing 




//min height for belt bearings
min_beltbearing_height = max(((belt_bearing[2]+m4_washer_thickness*2) * 2), y_bearing_block_height);
// main file
// x-carriage belt clamps
// Author: sdavi


include <lib/x-carriage_vslot.scad>

rotate([0,90,0])belt_clamp();

translate([20,0,0])rotate([0,90,0])belt_clamp();
